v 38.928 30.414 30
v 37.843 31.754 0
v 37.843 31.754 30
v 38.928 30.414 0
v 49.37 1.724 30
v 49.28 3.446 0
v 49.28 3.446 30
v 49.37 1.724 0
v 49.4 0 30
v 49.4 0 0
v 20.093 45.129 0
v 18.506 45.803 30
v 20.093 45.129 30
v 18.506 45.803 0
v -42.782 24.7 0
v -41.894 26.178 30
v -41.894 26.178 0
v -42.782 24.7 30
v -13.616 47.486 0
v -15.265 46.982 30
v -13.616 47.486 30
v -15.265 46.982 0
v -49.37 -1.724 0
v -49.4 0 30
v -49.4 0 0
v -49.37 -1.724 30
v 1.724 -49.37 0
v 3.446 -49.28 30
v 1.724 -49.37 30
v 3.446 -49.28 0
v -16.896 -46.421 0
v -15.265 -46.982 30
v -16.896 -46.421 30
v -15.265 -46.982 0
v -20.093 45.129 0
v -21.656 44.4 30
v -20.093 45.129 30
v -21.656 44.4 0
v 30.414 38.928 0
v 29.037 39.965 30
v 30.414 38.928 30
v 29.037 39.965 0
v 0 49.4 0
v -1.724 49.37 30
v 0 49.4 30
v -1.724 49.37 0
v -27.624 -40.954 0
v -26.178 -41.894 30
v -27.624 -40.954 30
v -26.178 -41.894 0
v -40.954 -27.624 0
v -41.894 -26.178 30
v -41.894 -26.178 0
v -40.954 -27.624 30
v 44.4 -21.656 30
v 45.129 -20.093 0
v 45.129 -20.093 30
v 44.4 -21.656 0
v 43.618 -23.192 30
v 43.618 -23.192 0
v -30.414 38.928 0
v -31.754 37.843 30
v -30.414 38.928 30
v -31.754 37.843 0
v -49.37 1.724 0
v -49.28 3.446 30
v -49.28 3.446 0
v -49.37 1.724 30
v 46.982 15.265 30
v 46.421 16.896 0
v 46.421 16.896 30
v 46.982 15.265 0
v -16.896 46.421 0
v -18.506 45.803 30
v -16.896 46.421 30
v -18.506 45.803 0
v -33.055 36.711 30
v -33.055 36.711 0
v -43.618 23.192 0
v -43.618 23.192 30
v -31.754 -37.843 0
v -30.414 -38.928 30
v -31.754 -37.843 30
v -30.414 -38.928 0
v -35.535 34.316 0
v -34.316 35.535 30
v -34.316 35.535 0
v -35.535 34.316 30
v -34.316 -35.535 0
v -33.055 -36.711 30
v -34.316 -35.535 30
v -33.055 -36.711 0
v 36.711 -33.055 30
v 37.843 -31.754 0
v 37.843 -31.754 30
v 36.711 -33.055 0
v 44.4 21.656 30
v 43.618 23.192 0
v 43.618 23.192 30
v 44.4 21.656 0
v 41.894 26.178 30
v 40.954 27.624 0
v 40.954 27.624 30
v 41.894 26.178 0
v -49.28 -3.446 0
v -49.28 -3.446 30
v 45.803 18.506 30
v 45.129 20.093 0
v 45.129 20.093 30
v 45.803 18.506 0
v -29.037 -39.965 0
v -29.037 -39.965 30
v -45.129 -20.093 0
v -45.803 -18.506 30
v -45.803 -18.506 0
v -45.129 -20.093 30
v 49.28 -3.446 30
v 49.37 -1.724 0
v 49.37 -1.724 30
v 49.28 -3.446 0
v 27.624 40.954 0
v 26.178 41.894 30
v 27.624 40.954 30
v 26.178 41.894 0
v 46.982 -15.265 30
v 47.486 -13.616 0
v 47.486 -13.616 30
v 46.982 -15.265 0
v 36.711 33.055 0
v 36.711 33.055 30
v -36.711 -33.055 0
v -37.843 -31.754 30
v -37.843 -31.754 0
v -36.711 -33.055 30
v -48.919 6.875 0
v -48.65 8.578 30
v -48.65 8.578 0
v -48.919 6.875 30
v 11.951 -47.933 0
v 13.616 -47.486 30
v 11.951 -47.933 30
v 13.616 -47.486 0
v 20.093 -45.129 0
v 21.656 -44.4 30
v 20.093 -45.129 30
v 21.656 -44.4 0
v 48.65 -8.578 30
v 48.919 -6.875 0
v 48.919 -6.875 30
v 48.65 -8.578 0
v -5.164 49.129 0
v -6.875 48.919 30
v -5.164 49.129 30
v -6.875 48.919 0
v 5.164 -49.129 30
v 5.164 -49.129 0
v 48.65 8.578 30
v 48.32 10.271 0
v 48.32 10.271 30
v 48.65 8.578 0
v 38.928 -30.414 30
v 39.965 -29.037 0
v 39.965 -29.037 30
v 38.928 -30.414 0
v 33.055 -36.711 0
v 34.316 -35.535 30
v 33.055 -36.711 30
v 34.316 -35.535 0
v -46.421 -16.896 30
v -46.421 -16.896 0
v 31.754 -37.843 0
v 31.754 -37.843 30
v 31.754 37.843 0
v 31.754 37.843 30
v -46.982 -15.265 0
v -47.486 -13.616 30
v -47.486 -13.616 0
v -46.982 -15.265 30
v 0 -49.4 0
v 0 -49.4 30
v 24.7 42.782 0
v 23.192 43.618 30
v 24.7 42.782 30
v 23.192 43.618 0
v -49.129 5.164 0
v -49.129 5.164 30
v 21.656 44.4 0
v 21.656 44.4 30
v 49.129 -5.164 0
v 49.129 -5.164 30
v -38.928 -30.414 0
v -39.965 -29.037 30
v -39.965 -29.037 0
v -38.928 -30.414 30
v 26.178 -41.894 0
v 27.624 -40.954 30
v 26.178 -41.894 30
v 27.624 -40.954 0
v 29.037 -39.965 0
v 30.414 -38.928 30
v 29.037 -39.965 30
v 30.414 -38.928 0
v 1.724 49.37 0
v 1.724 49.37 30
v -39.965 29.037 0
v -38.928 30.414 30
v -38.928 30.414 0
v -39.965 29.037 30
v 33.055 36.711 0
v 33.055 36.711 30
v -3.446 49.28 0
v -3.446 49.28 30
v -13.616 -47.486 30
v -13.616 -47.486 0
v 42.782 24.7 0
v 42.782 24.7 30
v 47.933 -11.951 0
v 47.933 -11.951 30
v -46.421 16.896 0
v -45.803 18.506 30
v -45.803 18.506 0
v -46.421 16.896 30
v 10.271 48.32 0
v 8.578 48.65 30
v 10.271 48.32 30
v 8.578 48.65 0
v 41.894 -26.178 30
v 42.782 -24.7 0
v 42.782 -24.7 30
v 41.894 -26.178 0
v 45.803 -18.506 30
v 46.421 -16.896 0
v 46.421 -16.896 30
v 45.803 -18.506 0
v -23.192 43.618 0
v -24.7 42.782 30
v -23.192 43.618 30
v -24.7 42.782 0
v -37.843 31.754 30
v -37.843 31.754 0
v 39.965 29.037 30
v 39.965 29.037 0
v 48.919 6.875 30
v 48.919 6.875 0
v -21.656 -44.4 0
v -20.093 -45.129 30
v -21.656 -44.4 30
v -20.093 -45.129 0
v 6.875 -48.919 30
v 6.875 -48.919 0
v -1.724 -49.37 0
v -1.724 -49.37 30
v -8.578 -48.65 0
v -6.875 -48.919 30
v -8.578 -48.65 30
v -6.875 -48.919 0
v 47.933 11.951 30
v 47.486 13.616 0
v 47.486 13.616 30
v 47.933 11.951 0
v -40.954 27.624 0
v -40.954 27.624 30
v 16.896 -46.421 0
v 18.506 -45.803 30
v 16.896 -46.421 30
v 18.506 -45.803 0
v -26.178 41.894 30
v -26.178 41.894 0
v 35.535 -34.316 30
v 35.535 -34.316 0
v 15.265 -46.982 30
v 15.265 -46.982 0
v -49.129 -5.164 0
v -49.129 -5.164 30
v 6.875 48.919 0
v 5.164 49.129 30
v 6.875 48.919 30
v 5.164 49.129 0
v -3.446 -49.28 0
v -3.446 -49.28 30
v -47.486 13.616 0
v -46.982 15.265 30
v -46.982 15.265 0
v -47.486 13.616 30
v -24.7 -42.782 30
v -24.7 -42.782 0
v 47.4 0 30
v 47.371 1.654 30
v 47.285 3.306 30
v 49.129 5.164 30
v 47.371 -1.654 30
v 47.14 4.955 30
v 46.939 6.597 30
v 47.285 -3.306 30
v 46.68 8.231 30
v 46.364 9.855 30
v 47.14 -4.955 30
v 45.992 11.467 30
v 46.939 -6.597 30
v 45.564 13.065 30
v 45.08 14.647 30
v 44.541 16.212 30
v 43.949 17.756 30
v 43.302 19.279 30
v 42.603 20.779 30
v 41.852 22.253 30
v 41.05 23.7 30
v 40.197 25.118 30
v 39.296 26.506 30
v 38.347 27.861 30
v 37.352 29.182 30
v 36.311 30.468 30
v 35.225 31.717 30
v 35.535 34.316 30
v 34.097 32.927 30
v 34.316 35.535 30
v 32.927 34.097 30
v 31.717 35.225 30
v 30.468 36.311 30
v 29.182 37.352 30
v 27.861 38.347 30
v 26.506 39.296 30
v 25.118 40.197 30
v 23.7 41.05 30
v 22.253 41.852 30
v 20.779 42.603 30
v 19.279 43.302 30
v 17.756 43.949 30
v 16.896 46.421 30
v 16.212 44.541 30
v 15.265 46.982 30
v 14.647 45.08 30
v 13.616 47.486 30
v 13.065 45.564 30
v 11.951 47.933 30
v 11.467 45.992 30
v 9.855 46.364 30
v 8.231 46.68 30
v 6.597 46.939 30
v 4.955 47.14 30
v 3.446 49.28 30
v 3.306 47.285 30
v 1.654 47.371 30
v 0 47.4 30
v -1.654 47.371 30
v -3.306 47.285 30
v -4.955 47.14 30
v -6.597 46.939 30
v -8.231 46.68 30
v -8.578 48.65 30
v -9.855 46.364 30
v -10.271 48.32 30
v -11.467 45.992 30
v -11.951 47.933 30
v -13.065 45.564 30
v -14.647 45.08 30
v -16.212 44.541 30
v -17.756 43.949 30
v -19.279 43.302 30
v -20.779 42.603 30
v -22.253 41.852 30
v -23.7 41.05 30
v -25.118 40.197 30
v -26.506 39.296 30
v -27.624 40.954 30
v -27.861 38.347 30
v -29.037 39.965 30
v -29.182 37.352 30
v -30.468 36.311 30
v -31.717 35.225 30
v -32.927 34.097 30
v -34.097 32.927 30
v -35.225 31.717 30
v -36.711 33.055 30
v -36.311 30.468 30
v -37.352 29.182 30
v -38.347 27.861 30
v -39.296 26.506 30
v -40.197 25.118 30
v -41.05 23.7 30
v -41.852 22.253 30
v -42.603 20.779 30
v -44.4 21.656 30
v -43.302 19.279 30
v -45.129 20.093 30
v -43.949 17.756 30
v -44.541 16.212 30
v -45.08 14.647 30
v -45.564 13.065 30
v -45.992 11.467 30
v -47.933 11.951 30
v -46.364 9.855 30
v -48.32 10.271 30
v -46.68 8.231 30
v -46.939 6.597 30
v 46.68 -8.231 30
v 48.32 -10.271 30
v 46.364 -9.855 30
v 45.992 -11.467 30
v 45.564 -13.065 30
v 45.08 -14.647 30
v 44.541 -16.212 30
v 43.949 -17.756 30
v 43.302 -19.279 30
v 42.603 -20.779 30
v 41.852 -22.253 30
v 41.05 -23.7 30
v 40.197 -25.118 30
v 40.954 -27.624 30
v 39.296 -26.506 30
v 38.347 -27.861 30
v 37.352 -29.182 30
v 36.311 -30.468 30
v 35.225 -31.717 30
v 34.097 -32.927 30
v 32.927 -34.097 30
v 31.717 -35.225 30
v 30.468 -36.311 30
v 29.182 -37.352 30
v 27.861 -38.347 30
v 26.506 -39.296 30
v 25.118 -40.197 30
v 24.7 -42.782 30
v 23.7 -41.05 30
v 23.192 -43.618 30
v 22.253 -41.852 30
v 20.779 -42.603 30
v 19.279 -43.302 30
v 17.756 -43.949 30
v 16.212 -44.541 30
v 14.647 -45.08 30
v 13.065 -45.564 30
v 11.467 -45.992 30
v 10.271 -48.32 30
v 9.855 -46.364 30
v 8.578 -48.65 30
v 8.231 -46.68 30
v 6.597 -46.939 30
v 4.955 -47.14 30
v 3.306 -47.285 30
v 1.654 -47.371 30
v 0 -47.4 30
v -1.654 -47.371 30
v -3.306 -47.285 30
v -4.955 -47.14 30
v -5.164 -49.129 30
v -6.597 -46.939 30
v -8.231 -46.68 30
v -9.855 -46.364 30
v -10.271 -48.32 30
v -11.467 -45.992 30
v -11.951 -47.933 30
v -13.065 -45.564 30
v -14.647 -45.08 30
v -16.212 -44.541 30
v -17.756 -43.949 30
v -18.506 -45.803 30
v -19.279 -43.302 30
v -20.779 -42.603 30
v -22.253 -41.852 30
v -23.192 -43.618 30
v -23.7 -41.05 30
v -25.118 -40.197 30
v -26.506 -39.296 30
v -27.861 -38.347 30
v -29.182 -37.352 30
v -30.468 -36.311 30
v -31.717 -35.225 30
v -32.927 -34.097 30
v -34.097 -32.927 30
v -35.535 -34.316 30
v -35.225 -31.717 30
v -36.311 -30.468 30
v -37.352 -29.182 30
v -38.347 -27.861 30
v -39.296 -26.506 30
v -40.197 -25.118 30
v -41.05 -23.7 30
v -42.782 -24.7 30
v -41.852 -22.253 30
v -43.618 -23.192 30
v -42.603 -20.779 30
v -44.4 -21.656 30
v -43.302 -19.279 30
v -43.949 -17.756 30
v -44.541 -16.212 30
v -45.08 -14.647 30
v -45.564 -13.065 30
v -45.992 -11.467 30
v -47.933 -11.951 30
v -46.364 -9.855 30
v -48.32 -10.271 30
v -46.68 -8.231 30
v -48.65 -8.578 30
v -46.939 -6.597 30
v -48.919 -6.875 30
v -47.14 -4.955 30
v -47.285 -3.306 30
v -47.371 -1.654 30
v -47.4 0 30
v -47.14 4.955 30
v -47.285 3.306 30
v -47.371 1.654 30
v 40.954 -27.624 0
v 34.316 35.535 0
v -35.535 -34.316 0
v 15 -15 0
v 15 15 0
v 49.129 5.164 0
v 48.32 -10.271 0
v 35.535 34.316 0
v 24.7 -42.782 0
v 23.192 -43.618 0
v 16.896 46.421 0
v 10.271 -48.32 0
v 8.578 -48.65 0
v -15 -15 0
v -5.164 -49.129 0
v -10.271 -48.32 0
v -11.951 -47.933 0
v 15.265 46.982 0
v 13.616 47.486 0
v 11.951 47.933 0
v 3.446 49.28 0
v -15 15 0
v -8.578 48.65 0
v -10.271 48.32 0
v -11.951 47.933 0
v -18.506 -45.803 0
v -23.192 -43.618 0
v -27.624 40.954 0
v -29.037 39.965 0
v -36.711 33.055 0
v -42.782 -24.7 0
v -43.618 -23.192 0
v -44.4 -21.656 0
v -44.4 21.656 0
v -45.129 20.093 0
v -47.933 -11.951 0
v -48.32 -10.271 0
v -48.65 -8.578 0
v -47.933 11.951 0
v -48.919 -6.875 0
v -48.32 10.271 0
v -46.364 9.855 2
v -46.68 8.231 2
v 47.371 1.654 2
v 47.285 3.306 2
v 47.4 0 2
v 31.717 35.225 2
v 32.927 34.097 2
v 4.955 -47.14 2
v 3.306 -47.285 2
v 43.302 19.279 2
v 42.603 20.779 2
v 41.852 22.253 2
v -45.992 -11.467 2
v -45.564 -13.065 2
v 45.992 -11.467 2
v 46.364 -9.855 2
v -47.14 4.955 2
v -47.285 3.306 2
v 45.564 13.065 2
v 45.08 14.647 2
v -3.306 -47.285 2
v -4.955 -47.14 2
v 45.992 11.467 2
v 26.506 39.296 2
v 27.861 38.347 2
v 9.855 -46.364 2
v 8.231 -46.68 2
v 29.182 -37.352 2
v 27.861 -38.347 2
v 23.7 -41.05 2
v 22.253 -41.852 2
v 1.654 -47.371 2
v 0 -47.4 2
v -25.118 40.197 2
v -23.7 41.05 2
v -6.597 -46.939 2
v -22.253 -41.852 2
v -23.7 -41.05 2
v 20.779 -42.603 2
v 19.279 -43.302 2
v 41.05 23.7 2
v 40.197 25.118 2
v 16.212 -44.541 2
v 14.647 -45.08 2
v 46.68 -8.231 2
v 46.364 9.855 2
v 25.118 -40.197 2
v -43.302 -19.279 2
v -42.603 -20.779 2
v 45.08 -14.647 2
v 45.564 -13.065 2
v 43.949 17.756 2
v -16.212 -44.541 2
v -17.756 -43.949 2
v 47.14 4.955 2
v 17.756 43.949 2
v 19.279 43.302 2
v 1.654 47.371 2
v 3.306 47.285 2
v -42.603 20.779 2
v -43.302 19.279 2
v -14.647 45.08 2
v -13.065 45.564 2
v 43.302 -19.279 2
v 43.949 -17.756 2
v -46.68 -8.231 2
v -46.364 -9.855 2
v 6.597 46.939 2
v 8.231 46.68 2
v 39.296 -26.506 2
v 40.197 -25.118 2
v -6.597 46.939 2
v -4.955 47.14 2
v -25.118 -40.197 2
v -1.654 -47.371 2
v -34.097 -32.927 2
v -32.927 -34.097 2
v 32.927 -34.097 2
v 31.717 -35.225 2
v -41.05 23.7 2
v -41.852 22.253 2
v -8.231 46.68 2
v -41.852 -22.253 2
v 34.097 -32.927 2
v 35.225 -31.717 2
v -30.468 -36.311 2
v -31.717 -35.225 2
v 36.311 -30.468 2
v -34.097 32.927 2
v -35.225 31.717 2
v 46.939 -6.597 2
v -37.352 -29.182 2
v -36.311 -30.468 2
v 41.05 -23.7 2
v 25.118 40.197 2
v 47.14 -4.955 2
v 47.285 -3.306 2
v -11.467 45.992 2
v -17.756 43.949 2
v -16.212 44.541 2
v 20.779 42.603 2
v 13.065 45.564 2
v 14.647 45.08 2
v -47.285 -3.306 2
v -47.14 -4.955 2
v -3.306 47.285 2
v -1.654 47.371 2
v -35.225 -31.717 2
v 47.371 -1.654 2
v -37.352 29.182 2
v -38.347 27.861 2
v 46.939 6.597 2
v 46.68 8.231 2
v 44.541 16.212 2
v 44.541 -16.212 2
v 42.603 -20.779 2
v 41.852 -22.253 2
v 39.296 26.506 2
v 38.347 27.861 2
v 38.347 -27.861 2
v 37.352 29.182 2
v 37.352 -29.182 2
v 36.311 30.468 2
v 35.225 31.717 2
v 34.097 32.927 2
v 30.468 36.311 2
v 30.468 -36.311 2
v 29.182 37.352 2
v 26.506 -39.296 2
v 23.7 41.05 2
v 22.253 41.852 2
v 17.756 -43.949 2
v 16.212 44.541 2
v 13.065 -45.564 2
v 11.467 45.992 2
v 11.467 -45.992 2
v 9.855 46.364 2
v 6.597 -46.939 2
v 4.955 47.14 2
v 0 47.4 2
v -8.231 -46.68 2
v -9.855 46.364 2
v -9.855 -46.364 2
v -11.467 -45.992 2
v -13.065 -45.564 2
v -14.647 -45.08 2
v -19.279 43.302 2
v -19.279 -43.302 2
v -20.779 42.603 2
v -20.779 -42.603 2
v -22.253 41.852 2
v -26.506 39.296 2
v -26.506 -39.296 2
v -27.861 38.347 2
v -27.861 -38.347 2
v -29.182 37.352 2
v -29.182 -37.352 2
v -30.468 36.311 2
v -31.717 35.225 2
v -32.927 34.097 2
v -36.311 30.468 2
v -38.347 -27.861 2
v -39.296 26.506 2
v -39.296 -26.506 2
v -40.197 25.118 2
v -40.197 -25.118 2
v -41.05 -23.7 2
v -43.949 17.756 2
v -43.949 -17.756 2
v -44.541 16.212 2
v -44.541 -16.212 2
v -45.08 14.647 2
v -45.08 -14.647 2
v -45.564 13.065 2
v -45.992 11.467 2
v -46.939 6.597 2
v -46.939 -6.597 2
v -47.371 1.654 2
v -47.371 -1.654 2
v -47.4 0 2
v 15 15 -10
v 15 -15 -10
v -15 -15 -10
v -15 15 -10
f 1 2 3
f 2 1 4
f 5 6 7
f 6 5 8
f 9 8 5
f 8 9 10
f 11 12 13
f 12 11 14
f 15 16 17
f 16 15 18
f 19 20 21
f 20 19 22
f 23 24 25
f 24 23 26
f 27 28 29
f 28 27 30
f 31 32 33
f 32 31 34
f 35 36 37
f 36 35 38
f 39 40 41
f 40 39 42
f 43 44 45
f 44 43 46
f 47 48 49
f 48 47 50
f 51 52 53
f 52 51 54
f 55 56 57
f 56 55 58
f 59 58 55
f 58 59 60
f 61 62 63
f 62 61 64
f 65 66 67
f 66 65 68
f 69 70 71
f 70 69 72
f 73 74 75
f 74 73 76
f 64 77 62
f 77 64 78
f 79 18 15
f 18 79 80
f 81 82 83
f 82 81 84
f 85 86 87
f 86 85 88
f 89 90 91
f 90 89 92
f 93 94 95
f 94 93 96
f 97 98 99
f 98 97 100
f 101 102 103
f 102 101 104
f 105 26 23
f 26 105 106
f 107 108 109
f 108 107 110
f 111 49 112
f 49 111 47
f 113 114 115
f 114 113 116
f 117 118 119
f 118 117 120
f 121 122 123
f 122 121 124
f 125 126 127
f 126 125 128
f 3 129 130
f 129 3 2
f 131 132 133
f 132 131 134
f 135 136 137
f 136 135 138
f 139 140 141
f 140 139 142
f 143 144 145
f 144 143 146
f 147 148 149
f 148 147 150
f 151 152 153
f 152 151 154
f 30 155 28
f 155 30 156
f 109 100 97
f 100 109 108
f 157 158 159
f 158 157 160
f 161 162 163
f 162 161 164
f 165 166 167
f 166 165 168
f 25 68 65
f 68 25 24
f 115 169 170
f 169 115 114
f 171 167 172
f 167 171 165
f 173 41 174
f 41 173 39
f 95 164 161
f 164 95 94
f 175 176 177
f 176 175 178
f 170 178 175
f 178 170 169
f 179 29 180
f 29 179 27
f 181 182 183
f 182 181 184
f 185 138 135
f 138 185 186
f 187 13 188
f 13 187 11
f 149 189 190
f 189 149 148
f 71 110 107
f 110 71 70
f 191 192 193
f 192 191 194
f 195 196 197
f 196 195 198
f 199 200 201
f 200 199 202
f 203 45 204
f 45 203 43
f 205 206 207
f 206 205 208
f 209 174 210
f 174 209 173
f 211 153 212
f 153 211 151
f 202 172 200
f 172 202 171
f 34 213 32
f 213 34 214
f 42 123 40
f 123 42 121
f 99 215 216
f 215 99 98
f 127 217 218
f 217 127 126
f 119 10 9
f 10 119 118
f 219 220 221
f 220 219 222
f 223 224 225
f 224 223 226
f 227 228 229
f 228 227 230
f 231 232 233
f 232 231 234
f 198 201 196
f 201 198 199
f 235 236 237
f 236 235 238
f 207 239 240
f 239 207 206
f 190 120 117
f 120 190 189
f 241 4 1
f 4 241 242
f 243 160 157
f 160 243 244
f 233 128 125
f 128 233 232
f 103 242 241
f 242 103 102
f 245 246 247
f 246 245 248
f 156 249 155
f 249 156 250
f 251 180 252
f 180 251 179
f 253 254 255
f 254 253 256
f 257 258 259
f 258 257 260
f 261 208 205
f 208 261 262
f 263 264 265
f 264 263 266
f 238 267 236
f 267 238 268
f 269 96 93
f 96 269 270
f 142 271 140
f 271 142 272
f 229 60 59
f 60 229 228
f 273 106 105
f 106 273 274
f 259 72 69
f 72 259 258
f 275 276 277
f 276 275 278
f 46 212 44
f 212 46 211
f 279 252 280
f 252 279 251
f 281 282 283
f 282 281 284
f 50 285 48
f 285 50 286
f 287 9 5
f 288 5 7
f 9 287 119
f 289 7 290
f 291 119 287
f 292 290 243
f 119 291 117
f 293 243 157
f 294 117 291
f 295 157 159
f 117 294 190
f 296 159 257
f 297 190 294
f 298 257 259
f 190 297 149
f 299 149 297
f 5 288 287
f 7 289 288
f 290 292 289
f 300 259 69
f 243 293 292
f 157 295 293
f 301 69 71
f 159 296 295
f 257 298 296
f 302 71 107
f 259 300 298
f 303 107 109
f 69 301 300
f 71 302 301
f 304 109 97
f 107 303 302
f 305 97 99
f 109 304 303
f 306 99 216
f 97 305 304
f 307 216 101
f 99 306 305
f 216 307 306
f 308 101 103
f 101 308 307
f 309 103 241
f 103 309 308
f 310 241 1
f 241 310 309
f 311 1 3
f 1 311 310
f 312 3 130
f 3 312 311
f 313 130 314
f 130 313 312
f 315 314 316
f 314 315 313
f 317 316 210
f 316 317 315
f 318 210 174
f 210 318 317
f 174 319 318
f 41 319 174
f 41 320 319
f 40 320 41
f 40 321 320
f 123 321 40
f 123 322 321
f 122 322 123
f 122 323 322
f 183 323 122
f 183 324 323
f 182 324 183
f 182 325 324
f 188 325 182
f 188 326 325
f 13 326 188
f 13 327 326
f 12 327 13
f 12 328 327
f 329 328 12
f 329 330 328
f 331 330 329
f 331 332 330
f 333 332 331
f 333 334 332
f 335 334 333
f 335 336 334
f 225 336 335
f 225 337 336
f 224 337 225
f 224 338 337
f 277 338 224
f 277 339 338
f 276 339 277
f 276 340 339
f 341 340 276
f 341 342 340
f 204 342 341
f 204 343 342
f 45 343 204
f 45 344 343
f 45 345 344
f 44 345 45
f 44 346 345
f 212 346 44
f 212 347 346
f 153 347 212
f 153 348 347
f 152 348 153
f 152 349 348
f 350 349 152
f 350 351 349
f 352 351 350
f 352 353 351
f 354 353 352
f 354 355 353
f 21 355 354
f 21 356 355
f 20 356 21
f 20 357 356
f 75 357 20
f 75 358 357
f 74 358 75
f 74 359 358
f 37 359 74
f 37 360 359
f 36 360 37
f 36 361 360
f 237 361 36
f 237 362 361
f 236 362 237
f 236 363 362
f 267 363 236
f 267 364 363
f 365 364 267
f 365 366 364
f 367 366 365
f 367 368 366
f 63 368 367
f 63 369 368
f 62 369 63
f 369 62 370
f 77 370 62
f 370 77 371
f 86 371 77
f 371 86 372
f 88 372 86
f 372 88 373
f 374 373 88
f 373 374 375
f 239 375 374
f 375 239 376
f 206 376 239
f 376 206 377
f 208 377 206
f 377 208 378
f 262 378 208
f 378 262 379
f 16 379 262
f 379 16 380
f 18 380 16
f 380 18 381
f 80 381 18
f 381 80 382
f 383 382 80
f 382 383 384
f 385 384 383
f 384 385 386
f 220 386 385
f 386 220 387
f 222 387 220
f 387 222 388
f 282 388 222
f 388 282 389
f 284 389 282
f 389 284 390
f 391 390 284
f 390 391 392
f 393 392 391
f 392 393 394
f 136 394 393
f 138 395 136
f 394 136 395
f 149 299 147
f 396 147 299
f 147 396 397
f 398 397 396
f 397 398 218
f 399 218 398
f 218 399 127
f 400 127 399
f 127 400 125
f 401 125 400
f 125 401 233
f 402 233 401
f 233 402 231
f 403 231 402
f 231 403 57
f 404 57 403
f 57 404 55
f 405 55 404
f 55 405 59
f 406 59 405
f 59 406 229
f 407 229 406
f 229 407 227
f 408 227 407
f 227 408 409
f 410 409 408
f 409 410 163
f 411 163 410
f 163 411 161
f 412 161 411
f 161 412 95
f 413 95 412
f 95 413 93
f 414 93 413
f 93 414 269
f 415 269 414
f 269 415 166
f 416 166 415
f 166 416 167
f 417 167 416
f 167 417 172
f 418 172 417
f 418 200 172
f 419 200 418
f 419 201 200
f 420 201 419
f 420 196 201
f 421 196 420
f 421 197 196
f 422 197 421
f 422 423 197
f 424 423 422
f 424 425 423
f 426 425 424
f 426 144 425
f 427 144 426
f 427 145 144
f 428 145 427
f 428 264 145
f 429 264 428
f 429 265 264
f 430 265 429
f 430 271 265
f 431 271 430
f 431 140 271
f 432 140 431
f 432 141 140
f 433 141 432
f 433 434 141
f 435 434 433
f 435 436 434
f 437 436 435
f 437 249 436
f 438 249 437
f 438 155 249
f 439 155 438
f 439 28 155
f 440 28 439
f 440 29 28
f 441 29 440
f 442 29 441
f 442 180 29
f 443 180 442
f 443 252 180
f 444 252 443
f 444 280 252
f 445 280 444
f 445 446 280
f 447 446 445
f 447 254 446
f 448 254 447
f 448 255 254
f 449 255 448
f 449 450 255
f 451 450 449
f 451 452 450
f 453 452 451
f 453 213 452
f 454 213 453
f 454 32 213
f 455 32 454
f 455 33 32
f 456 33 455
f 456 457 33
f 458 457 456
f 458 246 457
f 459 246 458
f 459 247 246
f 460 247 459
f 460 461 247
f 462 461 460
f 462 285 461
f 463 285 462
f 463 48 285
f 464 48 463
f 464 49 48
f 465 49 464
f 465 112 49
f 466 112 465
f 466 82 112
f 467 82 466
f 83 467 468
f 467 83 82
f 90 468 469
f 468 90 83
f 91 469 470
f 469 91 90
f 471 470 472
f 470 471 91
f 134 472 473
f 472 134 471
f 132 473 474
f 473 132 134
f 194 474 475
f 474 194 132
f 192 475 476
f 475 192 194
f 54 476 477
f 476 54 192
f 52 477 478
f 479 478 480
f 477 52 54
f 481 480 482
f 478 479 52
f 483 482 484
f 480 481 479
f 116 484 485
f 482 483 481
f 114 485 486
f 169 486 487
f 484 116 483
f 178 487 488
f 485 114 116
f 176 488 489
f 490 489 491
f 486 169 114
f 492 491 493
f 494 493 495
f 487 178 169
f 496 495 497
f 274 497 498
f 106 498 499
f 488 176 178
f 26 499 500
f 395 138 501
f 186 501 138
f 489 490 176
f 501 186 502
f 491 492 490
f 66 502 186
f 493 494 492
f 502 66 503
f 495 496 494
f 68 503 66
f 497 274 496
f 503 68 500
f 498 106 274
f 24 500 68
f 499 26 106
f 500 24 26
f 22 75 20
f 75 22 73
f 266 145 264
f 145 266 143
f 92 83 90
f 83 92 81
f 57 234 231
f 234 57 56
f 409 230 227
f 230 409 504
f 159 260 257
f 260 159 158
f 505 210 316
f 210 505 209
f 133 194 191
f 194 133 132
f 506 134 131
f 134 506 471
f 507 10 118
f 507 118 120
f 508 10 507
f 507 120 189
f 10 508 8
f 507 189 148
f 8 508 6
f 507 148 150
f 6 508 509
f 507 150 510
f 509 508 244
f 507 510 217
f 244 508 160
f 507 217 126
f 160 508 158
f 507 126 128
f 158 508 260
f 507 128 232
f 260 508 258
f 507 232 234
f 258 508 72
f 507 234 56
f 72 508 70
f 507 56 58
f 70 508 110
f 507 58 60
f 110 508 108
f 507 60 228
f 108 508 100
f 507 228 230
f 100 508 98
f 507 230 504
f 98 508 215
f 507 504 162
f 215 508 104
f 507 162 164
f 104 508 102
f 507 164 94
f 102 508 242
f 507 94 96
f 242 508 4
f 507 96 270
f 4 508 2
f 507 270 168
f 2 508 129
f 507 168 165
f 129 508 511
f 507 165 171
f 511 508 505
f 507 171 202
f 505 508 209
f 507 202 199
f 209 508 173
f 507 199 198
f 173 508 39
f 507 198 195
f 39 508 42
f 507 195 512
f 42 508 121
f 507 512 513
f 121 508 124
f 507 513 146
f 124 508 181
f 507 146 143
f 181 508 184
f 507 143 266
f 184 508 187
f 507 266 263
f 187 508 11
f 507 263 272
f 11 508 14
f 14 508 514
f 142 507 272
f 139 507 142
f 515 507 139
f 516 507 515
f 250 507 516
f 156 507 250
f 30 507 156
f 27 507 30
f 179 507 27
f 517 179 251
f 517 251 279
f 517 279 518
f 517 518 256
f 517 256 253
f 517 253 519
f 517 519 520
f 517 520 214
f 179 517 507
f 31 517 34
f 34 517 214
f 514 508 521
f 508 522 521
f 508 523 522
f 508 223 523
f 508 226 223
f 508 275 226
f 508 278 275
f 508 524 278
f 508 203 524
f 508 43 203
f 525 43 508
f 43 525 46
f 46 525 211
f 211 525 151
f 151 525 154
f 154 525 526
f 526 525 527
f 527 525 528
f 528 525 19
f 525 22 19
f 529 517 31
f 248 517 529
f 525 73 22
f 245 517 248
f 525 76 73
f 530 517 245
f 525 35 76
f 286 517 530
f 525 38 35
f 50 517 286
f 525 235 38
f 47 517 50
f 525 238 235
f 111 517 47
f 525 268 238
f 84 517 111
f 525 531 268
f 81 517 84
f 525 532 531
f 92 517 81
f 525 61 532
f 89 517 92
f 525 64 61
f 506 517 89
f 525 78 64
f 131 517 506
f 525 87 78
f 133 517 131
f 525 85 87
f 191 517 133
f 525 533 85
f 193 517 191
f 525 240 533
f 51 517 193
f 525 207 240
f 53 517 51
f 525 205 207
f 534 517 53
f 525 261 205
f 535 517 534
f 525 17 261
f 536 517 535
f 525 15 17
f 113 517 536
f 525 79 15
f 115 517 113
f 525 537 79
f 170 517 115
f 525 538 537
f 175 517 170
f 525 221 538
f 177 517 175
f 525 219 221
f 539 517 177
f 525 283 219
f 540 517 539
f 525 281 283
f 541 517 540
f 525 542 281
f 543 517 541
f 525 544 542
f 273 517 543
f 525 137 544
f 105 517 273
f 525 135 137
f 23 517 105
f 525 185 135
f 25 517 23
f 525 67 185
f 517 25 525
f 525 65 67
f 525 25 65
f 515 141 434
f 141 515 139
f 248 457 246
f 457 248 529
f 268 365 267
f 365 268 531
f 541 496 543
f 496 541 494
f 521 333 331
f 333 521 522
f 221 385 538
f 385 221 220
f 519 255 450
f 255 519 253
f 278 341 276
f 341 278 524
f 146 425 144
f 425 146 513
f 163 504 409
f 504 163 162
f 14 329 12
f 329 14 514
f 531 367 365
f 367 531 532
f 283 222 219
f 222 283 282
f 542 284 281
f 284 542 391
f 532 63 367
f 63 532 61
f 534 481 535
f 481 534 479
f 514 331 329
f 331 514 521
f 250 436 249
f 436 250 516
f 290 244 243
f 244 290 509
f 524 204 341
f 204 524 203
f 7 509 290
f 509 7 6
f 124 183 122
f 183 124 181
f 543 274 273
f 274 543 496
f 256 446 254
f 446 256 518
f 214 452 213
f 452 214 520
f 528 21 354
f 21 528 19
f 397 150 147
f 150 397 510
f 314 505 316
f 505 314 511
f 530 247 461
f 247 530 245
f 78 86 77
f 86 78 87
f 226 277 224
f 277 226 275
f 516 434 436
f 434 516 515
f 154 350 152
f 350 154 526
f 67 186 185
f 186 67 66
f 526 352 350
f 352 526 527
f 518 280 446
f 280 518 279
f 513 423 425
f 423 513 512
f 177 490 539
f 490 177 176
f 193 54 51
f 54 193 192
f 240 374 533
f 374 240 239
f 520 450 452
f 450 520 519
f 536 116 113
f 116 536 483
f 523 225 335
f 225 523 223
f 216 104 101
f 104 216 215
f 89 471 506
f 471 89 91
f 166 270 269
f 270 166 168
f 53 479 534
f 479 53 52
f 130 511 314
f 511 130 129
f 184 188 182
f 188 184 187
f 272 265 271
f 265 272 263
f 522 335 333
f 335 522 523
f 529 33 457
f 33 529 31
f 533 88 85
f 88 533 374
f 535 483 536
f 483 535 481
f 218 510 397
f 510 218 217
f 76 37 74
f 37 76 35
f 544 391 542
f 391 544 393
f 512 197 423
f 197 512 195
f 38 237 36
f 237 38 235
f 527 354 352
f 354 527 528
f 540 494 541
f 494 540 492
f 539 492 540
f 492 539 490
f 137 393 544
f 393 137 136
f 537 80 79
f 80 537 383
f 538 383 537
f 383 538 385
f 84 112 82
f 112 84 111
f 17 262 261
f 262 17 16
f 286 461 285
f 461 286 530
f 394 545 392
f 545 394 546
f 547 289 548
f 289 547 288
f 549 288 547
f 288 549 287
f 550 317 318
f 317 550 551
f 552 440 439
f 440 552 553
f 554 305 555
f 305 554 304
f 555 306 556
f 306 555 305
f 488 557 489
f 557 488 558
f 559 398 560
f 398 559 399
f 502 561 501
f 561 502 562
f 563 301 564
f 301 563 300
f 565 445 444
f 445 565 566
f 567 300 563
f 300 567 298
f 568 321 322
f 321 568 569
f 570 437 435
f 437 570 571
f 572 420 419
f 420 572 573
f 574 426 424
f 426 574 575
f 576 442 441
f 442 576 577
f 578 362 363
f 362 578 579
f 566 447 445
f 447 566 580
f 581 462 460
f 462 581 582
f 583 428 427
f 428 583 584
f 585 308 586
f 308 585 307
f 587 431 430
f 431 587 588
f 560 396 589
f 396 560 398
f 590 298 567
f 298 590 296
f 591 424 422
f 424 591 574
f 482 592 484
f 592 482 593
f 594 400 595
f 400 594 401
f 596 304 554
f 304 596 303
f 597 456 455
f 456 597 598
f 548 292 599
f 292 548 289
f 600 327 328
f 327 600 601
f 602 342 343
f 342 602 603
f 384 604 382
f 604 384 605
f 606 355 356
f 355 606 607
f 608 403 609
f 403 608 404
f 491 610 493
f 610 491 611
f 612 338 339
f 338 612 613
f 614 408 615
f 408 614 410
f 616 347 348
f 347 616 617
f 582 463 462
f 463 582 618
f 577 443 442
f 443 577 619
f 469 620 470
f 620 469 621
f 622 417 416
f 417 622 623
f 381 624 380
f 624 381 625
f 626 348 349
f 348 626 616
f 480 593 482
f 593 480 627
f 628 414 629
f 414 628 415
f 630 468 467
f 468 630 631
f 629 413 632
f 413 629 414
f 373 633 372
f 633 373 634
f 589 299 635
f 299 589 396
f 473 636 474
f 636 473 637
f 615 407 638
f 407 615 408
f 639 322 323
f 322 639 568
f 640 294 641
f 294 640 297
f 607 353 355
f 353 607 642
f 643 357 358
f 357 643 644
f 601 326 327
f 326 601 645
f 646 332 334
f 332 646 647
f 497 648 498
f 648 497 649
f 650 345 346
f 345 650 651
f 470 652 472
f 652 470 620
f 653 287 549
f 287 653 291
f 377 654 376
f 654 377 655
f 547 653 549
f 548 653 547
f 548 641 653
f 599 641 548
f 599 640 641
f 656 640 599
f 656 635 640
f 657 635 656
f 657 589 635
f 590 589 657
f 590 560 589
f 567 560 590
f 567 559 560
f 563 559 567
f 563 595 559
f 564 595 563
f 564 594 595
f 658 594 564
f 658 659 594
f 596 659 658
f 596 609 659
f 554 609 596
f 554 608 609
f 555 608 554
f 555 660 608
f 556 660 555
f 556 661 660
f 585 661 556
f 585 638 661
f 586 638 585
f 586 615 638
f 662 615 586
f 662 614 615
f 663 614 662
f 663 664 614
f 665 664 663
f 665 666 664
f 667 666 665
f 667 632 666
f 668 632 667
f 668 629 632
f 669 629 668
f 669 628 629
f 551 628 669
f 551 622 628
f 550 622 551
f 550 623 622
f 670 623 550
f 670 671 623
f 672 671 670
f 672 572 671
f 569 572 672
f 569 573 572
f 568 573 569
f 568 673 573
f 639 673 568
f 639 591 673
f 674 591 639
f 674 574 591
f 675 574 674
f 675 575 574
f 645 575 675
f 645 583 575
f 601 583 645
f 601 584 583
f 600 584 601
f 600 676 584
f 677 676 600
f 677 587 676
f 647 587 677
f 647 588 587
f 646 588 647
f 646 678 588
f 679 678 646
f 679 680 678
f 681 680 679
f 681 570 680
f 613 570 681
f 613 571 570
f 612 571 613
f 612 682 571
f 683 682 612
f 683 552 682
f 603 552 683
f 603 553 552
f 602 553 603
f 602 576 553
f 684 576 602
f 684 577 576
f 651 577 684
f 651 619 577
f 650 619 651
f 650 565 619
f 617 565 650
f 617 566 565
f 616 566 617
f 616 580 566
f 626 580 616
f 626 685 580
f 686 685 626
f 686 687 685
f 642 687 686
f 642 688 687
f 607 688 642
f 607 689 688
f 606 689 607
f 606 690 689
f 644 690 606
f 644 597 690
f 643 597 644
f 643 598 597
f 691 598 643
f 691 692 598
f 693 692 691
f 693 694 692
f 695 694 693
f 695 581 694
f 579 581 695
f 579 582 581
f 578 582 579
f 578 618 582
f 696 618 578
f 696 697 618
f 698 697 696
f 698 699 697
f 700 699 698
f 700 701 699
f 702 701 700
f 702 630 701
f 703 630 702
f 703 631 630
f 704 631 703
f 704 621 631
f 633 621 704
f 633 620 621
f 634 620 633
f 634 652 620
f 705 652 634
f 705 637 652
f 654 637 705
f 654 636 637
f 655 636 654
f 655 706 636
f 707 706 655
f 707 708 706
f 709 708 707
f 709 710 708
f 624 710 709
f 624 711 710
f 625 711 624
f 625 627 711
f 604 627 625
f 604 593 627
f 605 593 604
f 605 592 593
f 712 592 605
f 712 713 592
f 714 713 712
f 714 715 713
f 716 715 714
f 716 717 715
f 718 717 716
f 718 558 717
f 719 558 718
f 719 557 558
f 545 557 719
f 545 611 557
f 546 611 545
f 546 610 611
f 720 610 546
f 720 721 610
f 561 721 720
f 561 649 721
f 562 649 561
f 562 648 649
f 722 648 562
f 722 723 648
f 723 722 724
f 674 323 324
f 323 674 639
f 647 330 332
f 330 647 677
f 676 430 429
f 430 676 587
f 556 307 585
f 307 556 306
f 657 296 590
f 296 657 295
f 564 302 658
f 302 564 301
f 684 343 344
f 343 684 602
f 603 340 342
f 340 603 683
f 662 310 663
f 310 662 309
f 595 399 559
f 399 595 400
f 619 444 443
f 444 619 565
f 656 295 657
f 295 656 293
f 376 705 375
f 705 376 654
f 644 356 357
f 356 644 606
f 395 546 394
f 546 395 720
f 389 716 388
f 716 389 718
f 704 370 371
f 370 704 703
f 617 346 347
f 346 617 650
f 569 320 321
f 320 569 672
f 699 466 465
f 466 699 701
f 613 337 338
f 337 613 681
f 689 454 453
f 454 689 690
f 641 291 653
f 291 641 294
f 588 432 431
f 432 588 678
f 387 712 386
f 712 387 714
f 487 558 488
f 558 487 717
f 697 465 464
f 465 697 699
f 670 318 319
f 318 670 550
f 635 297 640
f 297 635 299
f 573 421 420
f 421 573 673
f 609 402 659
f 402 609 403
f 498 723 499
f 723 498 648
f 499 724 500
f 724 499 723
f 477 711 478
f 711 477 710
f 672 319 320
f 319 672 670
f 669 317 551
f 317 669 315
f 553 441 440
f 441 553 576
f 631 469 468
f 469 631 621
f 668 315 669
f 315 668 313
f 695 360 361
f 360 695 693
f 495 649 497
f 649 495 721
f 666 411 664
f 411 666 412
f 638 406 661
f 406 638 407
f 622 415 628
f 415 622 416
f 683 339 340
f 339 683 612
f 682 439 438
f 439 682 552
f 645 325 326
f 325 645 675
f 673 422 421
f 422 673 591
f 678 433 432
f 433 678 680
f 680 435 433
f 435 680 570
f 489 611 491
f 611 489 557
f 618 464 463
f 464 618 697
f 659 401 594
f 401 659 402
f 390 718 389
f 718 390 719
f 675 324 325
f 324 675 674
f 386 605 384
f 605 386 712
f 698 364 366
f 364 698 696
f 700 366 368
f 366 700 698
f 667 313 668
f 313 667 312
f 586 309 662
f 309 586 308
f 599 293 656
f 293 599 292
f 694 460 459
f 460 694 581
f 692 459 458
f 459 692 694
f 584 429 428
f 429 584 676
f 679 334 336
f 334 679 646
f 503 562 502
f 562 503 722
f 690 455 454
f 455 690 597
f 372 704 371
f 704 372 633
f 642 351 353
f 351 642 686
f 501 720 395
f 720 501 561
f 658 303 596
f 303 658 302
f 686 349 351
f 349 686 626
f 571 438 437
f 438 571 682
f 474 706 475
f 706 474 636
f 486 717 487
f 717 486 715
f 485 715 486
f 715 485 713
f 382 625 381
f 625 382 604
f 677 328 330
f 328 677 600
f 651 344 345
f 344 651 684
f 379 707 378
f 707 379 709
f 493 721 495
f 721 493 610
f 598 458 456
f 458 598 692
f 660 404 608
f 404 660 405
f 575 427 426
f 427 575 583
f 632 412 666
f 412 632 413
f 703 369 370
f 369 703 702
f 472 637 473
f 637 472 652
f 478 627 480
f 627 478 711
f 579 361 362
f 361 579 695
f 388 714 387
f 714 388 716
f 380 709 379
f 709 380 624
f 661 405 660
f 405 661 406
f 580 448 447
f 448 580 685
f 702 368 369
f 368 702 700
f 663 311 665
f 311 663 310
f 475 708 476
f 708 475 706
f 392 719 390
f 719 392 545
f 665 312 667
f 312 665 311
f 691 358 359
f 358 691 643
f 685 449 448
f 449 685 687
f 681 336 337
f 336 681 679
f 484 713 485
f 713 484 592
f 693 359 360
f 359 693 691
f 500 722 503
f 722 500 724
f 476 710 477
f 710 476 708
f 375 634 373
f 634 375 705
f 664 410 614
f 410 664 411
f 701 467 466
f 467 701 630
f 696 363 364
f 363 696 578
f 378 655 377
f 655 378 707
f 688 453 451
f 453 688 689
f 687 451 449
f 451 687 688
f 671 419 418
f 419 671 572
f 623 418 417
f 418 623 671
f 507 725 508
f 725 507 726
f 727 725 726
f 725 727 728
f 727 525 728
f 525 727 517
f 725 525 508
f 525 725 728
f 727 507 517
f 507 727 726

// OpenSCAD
$fn = 180;

vent_diameter = 98.8;
cap_thickness = 2;
cap_length = 30;

union() {
  difference() {
    cylinder(h=cap_length, d=vent_diameter);
    translate([0, 0, cap_thickness])
    cylinder(h=cap_length, d=vent_diameter - cap_thickness * 2);
  }

  translate([0, 0, -5])
  cube([30, 30, 10], center=true);
}
